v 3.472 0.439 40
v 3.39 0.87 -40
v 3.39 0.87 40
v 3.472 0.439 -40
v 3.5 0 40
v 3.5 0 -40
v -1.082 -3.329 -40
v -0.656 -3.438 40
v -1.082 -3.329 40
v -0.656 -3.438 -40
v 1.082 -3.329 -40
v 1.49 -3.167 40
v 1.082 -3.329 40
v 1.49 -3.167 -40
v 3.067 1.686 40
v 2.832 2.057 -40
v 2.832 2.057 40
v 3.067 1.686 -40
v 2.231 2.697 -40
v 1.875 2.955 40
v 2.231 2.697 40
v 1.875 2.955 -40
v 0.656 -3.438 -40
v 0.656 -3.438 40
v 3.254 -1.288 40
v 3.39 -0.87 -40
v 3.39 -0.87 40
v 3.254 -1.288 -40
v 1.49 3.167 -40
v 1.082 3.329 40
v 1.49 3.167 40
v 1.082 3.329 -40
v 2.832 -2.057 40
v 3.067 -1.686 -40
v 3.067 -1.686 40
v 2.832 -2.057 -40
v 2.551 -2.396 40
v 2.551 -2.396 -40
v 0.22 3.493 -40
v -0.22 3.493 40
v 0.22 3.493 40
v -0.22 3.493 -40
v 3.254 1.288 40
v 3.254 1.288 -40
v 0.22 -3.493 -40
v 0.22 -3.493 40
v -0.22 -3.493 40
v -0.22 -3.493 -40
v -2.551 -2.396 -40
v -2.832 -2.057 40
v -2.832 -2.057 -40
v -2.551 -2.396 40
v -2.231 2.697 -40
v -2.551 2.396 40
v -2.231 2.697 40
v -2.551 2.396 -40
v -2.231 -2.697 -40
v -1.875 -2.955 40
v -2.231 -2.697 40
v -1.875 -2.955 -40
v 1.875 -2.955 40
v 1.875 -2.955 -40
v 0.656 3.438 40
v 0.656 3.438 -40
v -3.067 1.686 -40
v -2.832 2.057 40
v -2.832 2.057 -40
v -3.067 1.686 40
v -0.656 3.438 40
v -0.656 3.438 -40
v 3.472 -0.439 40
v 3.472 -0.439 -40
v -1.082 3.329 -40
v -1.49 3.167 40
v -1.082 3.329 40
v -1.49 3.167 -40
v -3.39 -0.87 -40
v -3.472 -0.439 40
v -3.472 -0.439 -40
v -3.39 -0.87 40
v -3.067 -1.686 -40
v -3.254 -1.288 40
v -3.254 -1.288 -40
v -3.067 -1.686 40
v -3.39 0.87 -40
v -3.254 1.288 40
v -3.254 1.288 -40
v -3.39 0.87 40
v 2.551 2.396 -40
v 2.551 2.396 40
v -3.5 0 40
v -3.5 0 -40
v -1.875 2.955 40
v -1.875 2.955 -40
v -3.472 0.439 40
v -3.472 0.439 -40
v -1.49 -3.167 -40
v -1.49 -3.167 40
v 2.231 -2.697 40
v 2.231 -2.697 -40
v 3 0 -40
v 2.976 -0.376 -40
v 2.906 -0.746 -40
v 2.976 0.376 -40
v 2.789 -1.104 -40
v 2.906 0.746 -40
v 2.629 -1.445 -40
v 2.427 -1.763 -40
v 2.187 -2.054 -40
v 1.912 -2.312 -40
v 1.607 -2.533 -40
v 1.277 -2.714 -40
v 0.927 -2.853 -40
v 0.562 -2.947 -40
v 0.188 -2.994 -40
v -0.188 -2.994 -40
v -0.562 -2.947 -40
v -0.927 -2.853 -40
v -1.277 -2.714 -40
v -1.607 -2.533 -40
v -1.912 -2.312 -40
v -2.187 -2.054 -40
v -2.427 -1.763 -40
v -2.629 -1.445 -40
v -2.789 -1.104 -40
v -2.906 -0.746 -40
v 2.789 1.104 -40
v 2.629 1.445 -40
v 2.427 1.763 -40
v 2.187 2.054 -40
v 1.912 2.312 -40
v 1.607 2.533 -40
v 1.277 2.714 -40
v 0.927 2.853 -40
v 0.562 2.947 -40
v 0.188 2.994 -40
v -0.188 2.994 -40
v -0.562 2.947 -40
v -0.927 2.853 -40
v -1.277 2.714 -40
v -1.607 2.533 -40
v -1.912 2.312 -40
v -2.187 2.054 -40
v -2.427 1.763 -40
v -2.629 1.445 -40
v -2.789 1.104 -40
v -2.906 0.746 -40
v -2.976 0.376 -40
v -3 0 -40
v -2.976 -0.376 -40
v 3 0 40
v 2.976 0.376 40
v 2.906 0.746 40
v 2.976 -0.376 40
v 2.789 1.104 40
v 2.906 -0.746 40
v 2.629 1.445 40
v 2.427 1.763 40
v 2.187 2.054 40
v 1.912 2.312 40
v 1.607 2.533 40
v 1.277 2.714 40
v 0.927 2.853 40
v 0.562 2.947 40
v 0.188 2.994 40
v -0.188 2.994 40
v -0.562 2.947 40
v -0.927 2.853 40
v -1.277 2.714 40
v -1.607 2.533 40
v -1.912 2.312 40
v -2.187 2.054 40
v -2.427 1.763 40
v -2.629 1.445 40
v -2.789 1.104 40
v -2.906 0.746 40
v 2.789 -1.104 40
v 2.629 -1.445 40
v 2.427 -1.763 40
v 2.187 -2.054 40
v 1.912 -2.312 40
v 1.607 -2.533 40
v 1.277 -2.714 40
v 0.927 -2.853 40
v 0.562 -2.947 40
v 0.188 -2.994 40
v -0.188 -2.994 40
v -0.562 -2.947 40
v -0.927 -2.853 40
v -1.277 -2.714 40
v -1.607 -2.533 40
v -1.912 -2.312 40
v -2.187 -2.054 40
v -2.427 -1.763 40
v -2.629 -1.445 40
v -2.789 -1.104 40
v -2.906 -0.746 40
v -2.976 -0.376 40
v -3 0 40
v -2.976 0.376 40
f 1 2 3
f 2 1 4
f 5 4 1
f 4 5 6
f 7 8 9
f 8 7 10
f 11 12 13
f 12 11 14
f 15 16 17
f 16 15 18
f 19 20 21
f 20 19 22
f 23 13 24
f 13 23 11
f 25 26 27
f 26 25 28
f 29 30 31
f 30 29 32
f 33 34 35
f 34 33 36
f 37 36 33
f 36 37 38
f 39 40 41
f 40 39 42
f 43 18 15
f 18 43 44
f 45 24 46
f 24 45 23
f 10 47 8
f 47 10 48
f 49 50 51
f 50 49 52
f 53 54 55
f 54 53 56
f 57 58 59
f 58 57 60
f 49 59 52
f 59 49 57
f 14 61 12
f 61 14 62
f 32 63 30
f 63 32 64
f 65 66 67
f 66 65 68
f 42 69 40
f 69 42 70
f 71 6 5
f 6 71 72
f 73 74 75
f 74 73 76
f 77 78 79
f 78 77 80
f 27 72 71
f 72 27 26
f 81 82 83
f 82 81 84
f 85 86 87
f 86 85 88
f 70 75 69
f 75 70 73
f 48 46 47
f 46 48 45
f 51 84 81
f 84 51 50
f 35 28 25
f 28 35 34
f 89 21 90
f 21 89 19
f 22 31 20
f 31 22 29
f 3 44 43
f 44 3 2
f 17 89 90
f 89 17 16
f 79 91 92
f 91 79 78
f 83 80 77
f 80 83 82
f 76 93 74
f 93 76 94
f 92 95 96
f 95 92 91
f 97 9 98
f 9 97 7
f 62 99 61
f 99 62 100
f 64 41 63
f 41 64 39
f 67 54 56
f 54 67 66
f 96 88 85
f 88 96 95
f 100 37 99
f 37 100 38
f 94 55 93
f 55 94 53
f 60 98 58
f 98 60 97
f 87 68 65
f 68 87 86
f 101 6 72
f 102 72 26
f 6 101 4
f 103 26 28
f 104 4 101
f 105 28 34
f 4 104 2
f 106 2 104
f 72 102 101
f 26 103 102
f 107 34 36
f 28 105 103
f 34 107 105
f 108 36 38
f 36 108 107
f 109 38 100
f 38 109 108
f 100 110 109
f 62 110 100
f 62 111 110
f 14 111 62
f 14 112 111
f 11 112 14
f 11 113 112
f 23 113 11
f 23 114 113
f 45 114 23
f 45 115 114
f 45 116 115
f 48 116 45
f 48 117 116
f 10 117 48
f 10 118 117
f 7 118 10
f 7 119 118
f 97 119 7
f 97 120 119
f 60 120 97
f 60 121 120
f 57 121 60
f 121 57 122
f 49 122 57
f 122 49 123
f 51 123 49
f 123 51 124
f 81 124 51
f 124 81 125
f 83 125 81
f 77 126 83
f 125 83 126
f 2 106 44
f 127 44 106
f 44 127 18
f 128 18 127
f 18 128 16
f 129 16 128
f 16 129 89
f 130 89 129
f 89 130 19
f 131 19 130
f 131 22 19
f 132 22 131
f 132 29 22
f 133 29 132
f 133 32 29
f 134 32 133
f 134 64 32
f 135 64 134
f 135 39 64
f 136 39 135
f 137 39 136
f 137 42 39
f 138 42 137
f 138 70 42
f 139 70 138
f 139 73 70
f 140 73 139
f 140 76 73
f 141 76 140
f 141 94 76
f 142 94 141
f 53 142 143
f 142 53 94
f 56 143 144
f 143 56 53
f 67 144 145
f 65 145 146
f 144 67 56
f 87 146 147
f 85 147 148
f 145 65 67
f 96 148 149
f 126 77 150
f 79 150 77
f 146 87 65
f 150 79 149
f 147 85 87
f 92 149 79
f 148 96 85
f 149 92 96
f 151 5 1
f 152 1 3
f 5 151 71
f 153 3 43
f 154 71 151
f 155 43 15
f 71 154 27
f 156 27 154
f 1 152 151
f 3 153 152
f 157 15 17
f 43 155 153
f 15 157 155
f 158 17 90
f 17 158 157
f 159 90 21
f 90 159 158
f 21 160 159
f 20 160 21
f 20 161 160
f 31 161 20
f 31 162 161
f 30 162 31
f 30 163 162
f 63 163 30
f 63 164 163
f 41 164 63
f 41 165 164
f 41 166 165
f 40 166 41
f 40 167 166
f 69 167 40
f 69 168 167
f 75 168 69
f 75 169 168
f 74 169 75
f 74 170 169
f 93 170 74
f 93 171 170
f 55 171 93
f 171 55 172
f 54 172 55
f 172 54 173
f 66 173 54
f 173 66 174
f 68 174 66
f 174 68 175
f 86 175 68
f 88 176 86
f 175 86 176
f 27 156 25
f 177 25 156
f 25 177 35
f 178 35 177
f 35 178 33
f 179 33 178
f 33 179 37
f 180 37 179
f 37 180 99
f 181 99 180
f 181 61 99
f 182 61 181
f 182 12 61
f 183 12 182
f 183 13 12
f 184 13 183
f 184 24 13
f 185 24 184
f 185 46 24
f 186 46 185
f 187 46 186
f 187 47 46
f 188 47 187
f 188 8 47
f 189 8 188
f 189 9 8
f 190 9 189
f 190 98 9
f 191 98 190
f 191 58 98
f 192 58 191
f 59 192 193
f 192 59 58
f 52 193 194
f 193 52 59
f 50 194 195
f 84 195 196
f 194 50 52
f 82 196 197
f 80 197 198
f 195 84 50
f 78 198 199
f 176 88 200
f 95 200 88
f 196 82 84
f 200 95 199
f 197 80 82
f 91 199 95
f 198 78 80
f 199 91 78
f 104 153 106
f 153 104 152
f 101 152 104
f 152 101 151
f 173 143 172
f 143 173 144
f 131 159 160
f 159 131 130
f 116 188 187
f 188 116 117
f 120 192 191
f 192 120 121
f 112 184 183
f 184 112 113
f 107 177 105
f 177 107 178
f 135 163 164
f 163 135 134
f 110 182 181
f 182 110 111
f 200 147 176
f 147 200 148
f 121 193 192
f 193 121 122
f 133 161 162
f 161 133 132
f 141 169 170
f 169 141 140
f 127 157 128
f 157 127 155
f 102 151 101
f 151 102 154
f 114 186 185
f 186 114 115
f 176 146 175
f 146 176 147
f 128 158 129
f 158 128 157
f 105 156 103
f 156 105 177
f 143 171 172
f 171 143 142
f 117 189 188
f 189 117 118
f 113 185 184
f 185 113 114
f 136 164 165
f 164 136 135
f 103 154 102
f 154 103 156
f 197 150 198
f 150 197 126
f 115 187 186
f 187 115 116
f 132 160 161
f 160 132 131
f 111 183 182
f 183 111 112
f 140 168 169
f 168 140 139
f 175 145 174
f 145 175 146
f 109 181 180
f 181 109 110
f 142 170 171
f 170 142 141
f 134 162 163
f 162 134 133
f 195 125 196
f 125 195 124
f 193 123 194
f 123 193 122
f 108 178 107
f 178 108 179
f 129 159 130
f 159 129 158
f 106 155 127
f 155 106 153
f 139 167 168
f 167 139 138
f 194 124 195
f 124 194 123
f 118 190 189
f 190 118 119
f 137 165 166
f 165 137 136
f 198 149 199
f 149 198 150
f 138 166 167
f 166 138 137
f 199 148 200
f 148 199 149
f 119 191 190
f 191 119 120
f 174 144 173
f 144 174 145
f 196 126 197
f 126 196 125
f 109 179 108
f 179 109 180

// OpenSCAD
$fn = 50;


difference() {
	union() {
		translate(v = [0, 0, -40.0000000000]) {
			cylinder(h = 80, r = 3.5000000000);
		}
	}
	union() {
		translate(v = [0, 0, -100.0000000000]) {
			cylinder(h = 200, r = 3.0000000000);
		}
	}
}
